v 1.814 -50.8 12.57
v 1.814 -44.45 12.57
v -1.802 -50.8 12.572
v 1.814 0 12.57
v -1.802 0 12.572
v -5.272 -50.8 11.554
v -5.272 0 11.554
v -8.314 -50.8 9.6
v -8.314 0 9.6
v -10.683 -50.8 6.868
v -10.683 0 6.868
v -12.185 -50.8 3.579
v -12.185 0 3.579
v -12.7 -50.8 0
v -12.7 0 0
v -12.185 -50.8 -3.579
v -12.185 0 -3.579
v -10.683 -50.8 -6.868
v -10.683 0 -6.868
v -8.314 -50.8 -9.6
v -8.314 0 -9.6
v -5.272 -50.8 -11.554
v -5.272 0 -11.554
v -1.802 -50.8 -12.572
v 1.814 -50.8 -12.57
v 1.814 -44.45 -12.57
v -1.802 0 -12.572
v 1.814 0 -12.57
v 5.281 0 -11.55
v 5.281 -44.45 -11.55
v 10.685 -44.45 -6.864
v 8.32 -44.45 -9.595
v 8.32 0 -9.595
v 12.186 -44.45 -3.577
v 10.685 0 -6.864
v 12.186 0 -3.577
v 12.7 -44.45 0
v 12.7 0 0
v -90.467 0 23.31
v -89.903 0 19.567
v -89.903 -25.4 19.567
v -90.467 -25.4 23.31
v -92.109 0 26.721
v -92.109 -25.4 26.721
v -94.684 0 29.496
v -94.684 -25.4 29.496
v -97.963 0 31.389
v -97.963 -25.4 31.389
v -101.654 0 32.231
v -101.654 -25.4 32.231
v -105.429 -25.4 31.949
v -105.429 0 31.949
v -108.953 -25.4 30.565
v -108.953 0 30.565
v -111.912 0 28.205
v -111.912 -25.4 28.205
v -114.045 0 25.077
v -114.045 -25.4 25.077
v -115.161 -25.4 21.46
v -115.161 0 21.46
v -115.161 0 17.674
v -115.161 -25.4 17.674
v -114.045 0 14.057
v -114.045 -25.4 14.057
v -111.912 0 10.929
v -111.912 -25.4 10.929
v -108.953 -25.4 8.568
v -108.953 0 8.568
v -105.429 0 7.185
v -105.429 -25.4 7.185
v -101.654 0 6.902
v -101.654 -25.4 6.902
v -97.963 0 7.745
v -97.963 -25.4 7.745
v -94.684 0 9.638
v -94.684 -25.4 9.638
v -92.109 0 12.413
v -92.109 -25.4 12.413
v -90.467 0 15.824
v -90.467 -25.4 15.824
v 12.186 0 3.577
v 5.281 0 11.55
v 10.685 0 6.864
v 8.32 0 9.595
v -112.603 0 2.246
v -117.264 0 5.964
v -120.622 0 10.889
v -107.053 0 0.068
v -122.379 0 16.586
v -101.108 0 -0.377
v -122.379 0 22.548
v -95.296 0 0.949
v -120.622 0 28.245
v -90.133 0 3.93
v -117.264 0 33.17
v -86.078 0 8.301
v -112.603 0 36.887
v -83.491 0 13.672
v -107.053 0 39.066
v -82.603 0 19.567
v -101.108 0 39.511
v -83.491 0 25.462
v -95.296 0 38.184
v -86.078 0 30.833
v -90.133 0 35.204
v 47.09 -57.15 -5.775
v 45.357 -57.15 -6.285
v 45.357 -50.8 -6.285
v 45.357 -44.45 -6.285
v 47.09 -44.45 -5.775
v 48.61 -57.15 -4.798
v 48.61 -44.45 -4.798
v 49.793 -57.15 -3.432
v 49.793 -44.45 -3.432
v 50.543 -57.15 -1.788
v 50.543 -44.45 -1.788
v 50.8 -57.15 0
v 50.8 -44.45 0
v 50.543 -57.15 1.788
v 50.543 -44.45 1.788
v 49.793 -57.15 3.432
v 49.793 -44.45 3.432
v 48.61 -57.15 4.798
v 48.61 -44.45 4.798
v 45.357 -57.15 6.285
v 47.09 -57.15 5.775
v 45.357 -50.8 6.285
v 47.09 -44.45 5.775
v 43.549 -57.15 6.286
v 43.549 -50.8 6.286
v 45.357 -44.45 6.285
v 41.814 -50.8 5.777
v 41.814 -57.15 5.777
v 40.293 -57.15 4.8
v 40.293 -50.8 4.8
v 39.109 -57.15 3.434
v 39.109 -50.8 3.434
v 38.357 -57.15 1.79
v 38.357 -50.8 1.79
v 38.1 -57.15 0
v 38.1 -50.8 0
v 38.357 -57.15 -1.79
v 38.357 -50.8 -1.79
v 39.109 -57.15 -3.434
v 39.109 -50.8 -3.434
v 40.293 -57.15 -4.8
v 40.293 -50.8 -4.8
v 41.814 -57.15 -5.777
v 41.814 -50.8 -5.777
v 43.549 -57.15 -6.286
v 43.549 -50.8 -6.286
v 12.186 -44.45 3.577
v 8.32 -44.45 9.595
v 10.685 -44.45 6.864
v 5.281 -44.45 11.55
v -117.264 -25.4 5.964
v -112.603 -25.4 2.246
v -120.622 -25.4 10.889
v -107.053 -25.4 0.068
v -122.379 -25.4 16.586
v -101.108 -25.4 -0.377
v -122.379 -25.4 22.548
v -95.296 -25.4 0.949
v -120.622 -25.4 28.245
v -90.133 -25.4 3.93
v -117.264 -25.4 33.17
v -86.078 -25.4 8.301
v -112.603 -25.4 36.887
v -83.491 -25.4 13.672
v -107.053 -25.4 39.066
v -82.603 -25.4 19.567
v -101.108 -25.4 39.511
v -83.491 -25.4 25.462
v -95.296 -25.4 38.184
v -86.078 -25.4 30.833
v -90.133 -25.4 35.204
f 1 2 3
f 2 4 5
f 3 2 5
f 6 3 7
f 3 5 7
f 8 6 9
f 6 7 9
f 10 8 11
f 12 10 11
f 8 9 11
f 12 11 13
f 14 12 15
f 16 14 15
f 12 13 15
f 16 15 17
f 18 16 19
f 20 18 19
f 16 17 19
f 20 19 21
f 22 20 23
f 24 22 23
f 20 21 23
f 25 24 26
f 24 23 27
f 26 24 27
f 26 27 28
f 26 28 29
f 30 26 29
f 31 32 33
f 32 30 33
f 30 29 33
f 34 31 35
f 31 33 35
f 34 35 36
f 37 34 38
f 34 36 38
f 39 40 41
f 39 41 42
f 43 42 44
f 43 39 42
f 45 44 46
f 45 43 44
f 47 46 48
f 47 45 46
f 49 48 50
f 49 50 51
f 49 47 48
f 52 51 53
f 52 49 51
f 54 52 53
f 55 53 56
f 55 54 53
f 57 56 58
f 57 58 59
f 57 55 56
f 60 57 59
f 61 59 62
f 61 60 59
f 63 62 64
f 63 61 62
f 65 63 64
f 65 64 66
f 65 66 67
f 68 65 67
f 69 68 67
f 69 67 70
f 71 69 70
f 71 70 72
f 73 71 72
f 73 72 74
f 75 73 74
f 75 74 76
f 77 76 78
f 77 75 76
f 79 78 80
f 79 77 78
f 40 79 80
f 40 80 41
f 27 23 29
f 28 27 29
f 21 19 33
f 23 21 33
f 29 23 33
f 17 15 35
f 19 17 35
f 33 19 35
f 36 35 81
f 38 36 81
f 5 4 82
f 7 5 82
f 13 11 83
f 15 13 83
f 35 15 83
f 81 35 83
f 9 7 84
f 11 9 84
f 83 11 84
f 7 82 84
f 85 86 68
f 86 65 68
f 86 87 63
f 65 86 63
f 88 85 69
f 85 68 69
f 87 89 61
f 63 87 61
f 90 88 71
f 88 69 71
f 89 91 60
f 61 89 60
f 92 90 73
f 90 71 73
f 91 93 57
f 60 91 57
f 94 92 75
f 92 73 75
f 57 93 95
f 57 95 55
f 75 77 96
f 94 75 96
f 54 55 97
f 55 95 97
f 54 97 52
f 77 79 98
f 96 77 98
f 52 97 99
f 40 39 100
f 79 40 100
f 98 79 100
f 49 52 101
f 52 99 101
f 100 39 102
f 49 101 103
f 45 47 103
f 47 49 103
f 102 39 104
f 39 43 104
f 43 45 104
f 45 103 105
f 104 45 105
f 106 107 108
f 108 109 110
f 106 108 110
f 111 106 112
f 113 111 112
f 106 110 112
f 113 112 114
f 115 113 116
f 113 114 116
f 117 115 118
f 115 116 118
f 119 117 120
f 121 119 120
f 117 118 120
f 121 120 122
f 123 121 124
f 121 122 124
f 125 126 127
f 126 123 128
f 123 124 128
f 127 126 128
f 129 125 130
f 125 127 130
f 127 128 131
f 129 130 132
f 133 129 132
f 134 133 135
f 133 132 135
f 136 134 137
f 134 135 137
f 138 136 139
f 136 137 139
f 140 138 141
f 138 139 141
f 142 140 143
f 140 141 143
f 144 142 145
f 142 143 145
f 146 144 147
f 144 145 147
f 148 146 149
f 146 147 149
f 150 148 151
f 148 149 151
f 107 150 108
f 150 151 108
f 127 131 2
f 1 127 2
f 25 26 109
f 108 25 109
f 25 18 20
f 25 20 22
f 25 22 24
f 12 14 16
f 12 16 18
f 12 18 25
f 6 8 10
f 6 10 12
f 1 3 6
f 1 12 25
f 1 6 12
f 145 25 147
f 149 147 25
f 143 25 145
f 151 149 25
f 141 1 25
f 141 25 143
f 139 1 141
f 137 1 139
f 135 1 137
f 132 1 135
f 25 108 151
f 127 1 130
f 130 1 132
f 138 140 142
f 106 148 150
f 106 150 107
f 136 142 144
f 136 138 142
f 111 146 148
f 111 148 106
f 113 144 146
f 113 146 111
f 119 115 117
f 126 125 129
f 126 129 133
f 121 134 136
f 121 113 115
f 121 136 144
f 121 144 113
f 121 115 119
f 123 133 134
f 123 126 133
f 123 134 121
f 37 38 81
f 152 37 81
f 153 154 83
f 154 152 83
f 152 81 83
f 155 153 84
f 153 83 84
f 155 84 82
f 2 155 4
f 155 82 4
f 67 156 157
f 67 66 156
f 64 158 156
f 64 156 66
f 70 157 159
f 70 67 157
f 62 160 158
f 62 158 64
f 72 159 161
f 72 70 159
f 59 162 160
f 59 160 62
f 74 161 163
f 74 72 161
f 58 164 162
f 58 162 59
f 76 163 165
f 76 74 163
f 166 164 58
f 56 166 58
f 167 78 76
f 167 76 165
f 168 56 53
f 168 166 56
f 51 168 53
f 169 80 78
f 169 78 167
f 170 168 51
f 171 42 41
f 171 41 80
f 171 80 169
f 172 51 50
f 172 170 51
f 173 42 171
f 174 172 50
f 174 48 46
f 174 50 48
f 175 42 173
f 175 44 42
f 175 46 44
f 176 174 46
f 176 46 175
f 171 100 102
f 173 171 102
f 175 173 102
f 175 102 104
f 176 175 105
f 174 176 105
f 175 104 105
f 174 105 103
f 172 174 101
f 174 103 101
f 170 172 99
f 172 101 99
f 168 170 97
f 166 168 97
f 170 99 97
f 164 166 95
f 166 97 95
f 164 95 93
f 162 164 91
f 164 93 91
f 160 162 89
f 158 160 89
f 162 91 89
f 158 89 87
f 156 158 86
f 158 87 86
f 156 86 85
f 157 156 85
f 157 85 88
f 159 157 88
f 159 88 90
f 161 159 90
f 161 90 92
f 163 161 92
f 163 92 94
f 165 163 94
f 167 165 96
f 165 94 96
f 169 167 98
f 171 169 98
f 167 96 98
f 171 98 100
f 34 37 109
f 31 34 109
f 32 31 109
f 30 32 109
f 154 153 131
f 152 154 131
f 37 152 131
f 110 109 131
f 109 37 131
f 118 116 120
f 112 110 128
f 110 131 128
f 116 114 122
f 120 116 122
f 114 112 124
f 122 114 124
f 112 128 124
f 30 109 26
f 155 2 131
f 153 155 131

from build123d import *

# Parameters (mm, degrees)
F1_DEPTH = 50.8
F2_START = 44.45
F2_DEPTH = 6.35
F3_START = 50.8
F3_DEPTH = 6.35
F4_R     = 20
F4_R_2   = 12.7
F5_DEPTH = 25.4


with BuildPart() as f1:
    # F0 (on Front) → F1 (new body)
    with BuildSketch(Plane.XZ):
        with BuildLine():
            ThreePointArc((1.8142857143, -12.5697401464), (9.6002976144, -8.314101618), (12.7, 0))
            ThreePointArc((12.7, 0), (9.6002976144, 8.314101618), (1.8142857143, 12.5697401464))
            ThreePointArc((1.8142857143, 12.5697401464), (-12.7, 0), (1.8142857143, -12.5697401464))
        make_face()
    extrude(amount=F1_DEPTH)

    # F0 (on Front) → F2 (join)
    with BuildSketch(Plane.XZ.offset(F2_START)):
        with BuildLine():
            ThreePointArc((1.8142857143, 12.5697401464), (9.6002976144, 8.314101618), (12.7, 0))
            Line((12.7, 0), (38.1, 0))
            ThreePointArc((38.1, 0), (40.292949191, 4.8001488072), (45.3571428571, 6.2848700732))
            Line((45.3571428571, 6.2848700732), (1.8142857143, 12.5697401464))
        make_face()
        with BuildLine():
            Line((38.1, 0), (12.7, 0))
            ThreePointArc((12.7, 0), (9.6002976144, -8.314101618), (1.8142857143, -12.5697401464))
            Line((1.8142857143, -12.5697401464), (45.3571428571, -6.2848700732))
            ThreePointArc((45.3571428571, -6.2848700732), (40.292949191, -4.8001488072), (38.1, 0))
        make_face()
        with BuildLine():
            ThreePointArc((45.3571428571, 6.2848700732), (40.292949191, 4.8001488072), (38.1, 0))
            ThreePointArc((38.1, 0), (40.292949191, -4.8001488072), (45.3571428571, -6.2848700732))
            ThreePointArc((45.3571428571, -6.2848700732), (49.2501488072, -4.157050809), (50.8, 0))
            ThreePointArc((50.8, 0), (49.2501488072, 4.157050809), (45.3571428571, 6.2848700732))
        make_face()
    extrude(amount=F2_DEPTH)

    # F0 (on Front) → F3 (join)
    with BuildSketch(Plane.XZ.offset(F3_START)):
        with BuildLine():
            ThreePointArc((45.3571428571, 6.2848700732), (40.292949191, 4.8001488072), (38.1, 0))
            ThreePointArc((38.1, 0), (40.292949191, -4.8001488072), (45.3571428571, -6.2848700732))
            ThreePointArc((45.3571428571, -6.2848700732), (49.2501488072, -4.157050809), (50.8, 0))
            ThreePointArc((50.8, 0), (49.2501488072, 4.157050809), (45.3571428571, 6.2848700732))
        make_face()
    extrude(amount=F3_DEPTH)


with BuildPart() as f5:
    # F4 (on Front) → F5 (new body)
    with BuildSketch(Plane.XZ):
        with Locations((-102.6025786996, 19.5669587702)):
            Circle(F4_R)
        with Locations((-102.6025786996, 19.5669587702)):
            Circle(F4_R_2, mode=Mode.SUBTRACT)
    extrude(amount=F5_DEPTH)


solid = Compound([f1.part, f5.part])
